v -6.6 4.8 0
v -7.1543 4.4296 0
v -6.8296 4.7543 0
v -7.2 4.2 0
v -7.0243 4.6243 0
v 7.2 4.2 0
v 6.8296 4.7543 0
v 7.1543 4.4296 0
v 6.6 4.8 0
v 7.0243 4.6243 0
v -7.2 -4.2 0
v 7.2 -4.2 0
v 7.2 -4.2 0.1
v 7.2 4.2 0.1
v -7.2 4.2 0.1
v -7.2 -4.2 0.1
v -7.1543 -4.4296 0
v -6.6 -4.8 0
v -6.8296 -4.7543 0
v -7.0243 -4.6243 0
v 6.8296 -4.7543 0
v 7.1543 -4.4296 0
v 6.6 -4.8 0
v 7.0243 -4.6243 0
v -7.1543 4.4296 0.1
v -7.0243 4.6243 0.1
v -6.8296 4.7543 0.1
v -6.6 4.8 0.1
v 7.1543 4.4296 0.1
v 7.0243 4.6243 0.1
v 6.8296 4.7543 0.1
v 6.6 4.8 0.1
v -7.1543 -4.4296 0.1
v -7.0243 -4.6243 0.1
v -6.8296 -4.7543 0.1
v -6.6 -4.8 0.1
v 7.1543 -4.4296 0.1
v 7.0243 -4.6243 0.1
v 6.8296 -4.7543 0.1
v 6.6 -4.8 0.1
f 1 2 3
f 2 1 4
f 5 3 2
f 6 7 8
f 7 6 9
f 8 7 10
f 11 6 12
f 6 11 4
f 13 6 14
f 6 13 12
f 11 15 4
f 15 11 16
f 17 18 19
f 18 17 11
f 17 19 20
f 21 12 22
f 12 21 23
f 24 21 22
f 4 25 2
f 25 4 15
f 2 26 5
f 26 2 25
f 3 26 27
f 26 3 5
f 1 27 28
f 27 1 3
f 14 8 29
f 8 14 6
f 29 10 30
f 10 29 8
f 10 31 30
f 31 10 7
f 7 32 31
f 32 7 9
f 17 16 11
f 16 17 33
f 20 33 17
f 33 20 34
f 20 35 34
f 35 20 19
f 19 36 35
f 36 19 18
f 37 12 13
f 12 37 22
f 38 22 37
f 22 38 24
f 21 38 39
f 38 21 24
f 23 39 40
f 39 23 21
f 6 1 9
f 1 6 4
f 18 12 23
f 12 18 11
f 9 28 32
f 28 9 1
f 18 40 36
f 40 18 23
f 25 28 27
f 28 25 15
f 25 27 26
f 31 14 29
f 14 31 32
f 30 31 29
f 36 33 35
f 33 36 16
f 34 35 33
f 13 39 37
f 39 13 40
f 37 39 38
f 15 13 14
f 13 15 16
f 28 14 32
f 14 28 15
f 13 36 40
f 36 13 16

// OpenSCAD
// file: ../p/box3u12.scad
use <../lib.scad>
function ldraw_lib__box3u12() = [
// 0 Box with 3 Parallel Faces without Any Edges
// 0 Name: box3u12.dat
// 0 Author: J.C. Tchang [tchang]
// 0 !LDRAW_ORG Primitive UPDATE 2014-02
// 0 !LICENSE Licensed under CC BY 4.0 : see CAreadme.txt
// 
// 0 BFC CERTIFY CCW
  [0,"BFC","CERTIFY"],
  [0,"BFC","CCW"],
// 
// 0 !HISTORY 2014-12-23 [PTadmin] Official Update 2014-02
// 
// 
// 4 16 -1 1 1 1 1 1 1 1 -1 -1 1 -1
  [4,16,-1,1,1,1,1,1,1,1,-1,-1,1,-1],
// 4 16 -1 1 1 -1 0 1 1 0 1 1 1 1
  [4,16,-1,1,1,-1,0,1,1,0,1,1,1,1],
// 4 16 1 1 -1 1 0 -1 -1 0 -1 -1 1 -1
  [4,16,1,1,-1,1,0,-1,-1,0,-1,-1,1,-1],
];
module ldraw_lib__box3u12(step=0, col=false, unit=2/5, alt=false, line=0.2, solid=!$preview)
    makepoly(ldraw_lib__box3u12(), step=step, col=col, unit=unit, alt=alt, line=line, solid=solid);
ldraw_lib__box3u12(line=0.2);
// file: ../p/1-4cyli.scad
use <../lib.scad>
function ldraw_lib__1_4cyli() = [
// 0 Cylinder 0.25
// 0 Name: 1-4cyli.dat
// 0 Author: James Jessiman
// 0 !LDRAW_ORG Primitive UPDATE 2012-01
// 0 !LICENSE Licensed under CC BY 4.0 : see CAreadme.txt
// 
// 0 BFC CERTIFY CCW
  [0,"BFC","CERTIFY"],
  [0,"BFC","CCW"],
// 
// 0 !HISTORY 2002-03-23 [sbliss] Added BFC statement.
// 0 !HISTORY 2002-04-25 [PTadmin] Official Update 2002-02
// 0 !HISTORY 2007-06-22 [PTadmin] Header formatted for Contributor Agreement
// 0 !HISTORY 2008-07-01 [PTadmin] Official Update 2008-01
// 0 !HISTORY 2012-02-16 [Philo] Changed to CCW
// 0 !HISTORY 2012-03-30 [PTadmin] Official Update 2012-01
// 
// 
// 4 16 1 1 0 0.9239 1 0.3827 0.9239 0 0.3827 1 0 0
  [4,16,1,1,0,0.9239,1,0.3827,0.9239,0,0.3827,1,0,0],
// 5 24 1 0 0 1 1 0 0.9239 0 0.3827 1 0 -1
  [5,24,1,0,0,1,1,0,0.9239,0,0.3827,1,0,-1],
// 4 16 0.9239 1 0.3827 0.7071 1 0.7071 0.7071 0 0.7071 0.9239 0 0.3827
  [4,16,0.9239,1,0.3827,0.7071,1,0.7071,0.7071,0,0.7071,0.9239,0,0.3827],
// 5 24 0.9239 0 0.3827 0.9239 1 0.3827 0.7071 0 0.7071 1 0 0
  [5,24,0.9239,0,0.3827,0.9239,1,0.3827,0.7071,0,0.7071,1,0,0],
// 4 16 0.7071 1 0.7071 0.3827 1 0.9239 0.3827 0 0.9239 0.7071 0 0.7071
  [4,16,0.7071,1,0.7071,0.3827,1,0.9239,0.3827,0,0.9239,0.7071,0,0.7071],
// 5 24 0.7071 0 0.7071 0.7071 1 0.7071 0.3827 0 0.9239 0.9239 0 0.3827
  [5,24,0.7071,0,0.7071,0.7071,1,0.7071,0.3827,0,0.9239,0.9239,0,0.3827],
// 4 16 0.3827 1 0.9239 0 1 1 0 0 1 0.3827 0 0.9239
  [4,16,0.3827,1,0.9239,0,1,1,0,0,1,0.3827,0,0.9239],
// 5 24 0.3827 0 0.9239 0.3827 1 0.9239 0 0 1 0.7071 0 0.7071
  [5,24,0.3827,0,0.9239,0.3827,1,0.9239,0,0,1,0.7071,0,0.7071],
// 5 24 0 0 1 0 1 1 0.3827 0 0.9239 -1 0 1
  [5,24,0,0,1,0,1,1,0.3827,0,0.9239,-1,0,1],
];
module ldraw_lib__1_4cyli(step=0, col=false, unit=2/5, alt=false, line=0.2, solid=!$preview)
    makepoly(ldraw_lib__1_4cyli(), step=step, col=col, unit=unit, alt=alt, line=line, solid=solid);
ldraw_lib__1_4cyli(line=0.2);
// file: s/stickerback012x018.scad
use <../../lib.scad>
use <../../p/1-4chrd.scad>
use <../../p/1-4cyli.scad>
use <../../p/box3u12.scad>
function ldraw_lib__s__stickerback012x018() = [
// 0 ~Sticker Back  1.2 x  1.8
// 0 Name: s\stickerback012x018.dat
// 0 Author: Takeshi Takahashi [RainbowDolphin]
// 0 !LDRAW_ORG Subpart UPDATE 2025-11
// 0 !LICENSE Licensed under CC BY 4.0 : see CAreadme.txt
// 
// 0 BFC CERTIFY CCW
  [0,"BFC","CERTIFY"],
  [0,"BFC","CCW"],
// 
// 0 !HISTORY 2025-11-30 [OrionP] Official Update 2025-11
// 
// 0 // Primitives
// 1 16 -16.5 0 10.5 -1.5 0 0 0 -1 0 0 0 1.5 1-4chrd.dat
  [1,16,-16.5,0,10.5,-1.5,0,0,0,-1,0,0,0,1.5, ldraw_lib__1_4chrd()],
// 1 16 16.5 0 10.5 1.5 0 0 0 -1 0 0 0 1.5 1-4chrd.dat
  [1,16,16.5,0,10.5,1.5,0,0,0,-1,0,0,0,1.5, ldraw_lib__1_4chrd()],
// 1 16 0 -.25 0 0 0 18 0 .25 0 10.5 0 0 box3u12.dat
  [1,16,0,-.25,0,0,0,18,0,.25,0,10.5,0,0, ldraw_lib__box3u12()],
// 1 16 -16.5 0 -10.5 -1.5 0 0 0 -1 0 0 0 -1.5 1-4chrd.dat
  [1,16,-16.5,0,-10.5,-1.5,0,0,0,-1,0,0,0,-1.5, ldraw_lib__1_4chrd()],
// 1 16 16.5 0 -10.5 1.5 0 0 0 -1 0 0 0 -1.5 1-4chrd.dat
  [1,16,16.5,0,-10.5,1.5,0,0,0,-1,0,0,0,-1.5, ldraw_lib__1_4chrd()],
// 1 16 -16.5 0 10.5 -1.5 0 0 0 -.25 0 0 0 1.5 1-4cyli.dat
  [1,16,-16.5,0,10.5,-1.5,0,0,0,-.25,0,0,0,1.5, ldraw_lib__1_4cyli()],
// 1 16 16.5 0 10.5 1.5 0 0 0 -.25 0 0 0 1.5 1-4cyli.dat
  [1,16,16.5,0,10.5,1.5,0,0,0,-.25,0,0,0,1.5, ldraw_lib__1_4cyli()],
// 1 16 -16.5 0 -10.5 -1.5 0 0 0 -.25 0 0 0 -1.5 1-4cyli.dat
  [1,16,-16.5,0,-10.5,-1.5,0,0,0,-.25,0,0,0,-1.5, ldraw_lib__1_4cyli()],
// 1 16 16.5 0 -10.5 1.5 0 0 0 -.25 0 0 0 -1.5 1-4cyli.dat
  [1,16,16.5,0,-10.5,1.5,0,0,0,-.25,0,0,0,-1.5, ldraw_lib__1_4cyli()],
// 0 // Bottom face
// 4 16 -18 0 10.5 -16.5 0 12 16.5 0 12 18 0 10.5
  [4,16,-18,0,10.5,-16.5,0,12,16.5,0,12,18,0,10.5],
// 4 16 -18 0 -10.5 18 0 -10.5 16.5 0 -12 -16.5 0 -12
  [4,16,-18,0,-10.5,18,0,-10.5,16.5,0,-12,-16.5,0,-12],
// 0 // Lateral face
// 4 16 -16.5 0 12 -16.5 -.25 12 16.5 -.25 12 16.5 0 12
  [4,16,-16.5,0,12,-16.5,-.25,12,16.5,-.25,12,16.5,0,12],
// 4 16 -16.5 0 -12 16.5 0 -12 16.5 -.25 -12 -16.5 -.25 -12
  [4,16,-16.5,0,-12,16.5,0,-12,16.5,-.25,-12,-16.5,-.25,-12],
];
module ldraw_lib__s__stickerback012x018(step=0, col=false, unit=2/5, alt=false, line=0.2, solid=!$preview)
    makepoly(ldraw_lib__s__stickerback012x018(), step=step, col=col, unit=unit, alt=alt, line=line, solid=solid);
ldraw_lib__s__stickerback012x018(line=0.2);
// file: ../p/1-4chrd.scad
use <../lib.scad>
function ldraw_lib__1_4chrd() = [
// 0 Chord 0.25
// 0 Name: 1-4chrd.dat
// 0 Author: Max Martin Richter [MMR1988]
// 0 !LDRAW_ORG Primitive UPDATE 2023-05
// 0 !LICENSE Licensed under CC BY 4.0 : see CAreadme.txt
// 
// 0 BFC CERTIFY CCW
  [0,"BFC","CERTIFY"],
  [0,"BFC","CCW"],
// 
// 0 !HISTORY 2004-04-22 [PTadmin] Official Update 2004-02
// 0 !HISTORY 2007-10-09 [PTadmin] Header formatted for Contributor Agreement
// 0 !HISTORY 2008-07-01 [PTadmin] Official Update 2008-01
// 0 !HISTORY 2012-08-02 [MMR1988] Re-creation with PrimGen2 and Rectifier
// 0 !HISTORY 2012-08-09 [PTadmin] Official Update 2012-02
// 0 !HISTORY 2023-10-27 [OrionP] Change author to MMR1988 from hafhead
// 0 !HISTORY 2023-10-31 [OrionP] Official Update 2023-05
// 
// 4 16 0.9239 0 0.3827 0.3827 0 0.9239 0 0 1 1 0 0
  [4,16,0.9239,0,0.3827,0.3827,0,0.9239,0,0,1,1,0,0],
// 3 16 0.7071 0 0.7071 0.3827 0 0.9239 0.9239 0 0.3827
  [3,16,0.7071,0,0.7071,0.3827,0,0.9239,0.9239,0,0.3827],
];
module ldraw_lib__1_4chrd(step=0, col=false, unit=2/5, alt=false, line=0.2, solid=!$preview)
    makepoly(ldraw_lib__1_4chrd(), step=step, col=col, unit=unit, alt=alt, line=line, solid=solid);
ldraw_lib__1_4chrd(line=0.2);
// main file
use <../lib.scad>
use <../p/1-4chrd.scad>
use <s/stickerback012x018.scad>
function ldraw_lib__4629791a() = [
// 0 Sticker  1.2 x  1.8 with Chrome Silver Mirror
// 0 Name: 4629791a.dat
// 0 Author: Takeshi Takahashi [RainbowDolphin]
// 0 !LDRAW_ORG Part UPDATE 2025-12
// 0 !LICENSE Licensed under CC BY 4.0 : see CAreadme.txt
// 
// 0 BFC CERTIFY CCW
  [0,"BFC","CERTIFY"],
  [0,"BFC","CCW"],
// 
// 0 !KEYWORDS BrickLink 5770stk01, Brickowl 151910, Lighthouse, Rebrickable 96624
// 0 !KEYWORDS Set 5770
// 
// 0 !HISTORY 2022-09-15 [PTadmin] Official Update 2022-05
// 0 !HISTORY 2025-08-24 [RainbowDolphin] Updated with latest sticker spec
// 0 !HISTORY 2025-11-30 [OrionP] Official Update 2025-11
// 0 !HISTORY 2025-12-25 [OrionP] Minor header edits
// 0 !HISTORY 2025-12-25 [OrionP] Official Update 2025-12
// 
// 1 16 0 0 0 1 0 0 0 1 0 0 0 1 s\stickerback012x018.dat
  [1,16,0,0,0,1,0,0,0,1,0,0,0,1, ldraw_lib__s__stickerback012x018()],
// 1 383 -16.5 -.25 10.5 -1.5 0 0 0 1 0 0 0 1.5 1-4chrd.dat
  [1,383,-16.5,-.25,10.5,-1.5,0,0,0,1,0,0,0,1.5, ldraw_lib__1_4chrd()],
// 1 383 16.5 -.25 10.5 1.5 0 0 0 1 0 0 0 1.5 1-4chrd.dat
  [1,383,16.5,-.25,10.5,1.5,0,0,0,1,0,0,0,1.5, ldraw_lib__1_4chrd()],
// 1 383 -16.5 -.25 -10.5 -1.5 0 0 0 1 0 0 0 -1.5 1-4chrd.dat
  [1,383,-16.5,-.25,-10.5,-1.5,0,0,0,1,0,0,0,-1.5, ldraw_lib__1_4chrd()],
// 1 383 16.5 -.25 -10.5 1.5 0 0 0 1 0 0 0 -1.5 1-4chrd.dat
  [1,383,16.5,-.25,-10.5,1.5,0,0,0,1,0,0,0,-1.5, ldraw_lib__1_4chrd()],
// 4 383 18 -.25 10.5 -18 -.25 10.5 -18 -.25 -10.5 18 -.25 -10.5
  [4,383,18,-.25,10.5,-18,-.25,10.5,-18,-.25,-10.5,18,-.25,-10.5],
// 4 383 16.5 -.25 12 -16.5 -.25 12 -18 -.25 10.5 18 -.25 10.5
  [4,383,16.5,-.25,12,-16.5,-.25,12,-18,-.25,10.5,18,-.25,10.5],
// 4 383 16.5 -.25 -12 18 -.25 -10.5 -18 -.25 -10.5 -16.5 -.25 -12
  [4,383,16.5,-.25,-12,18,-.25,-10.5,-18,-.25,-10.5,-16.5,-.25,-12],
];
module ldraw_lib__4629791a(step=0, col=false, unit=2/5, alt=false, line=0.2, solid=!$preview)
    makepoly(ldraw_lib__4629791a(), step=step, col=col, unit=unit, alt=alt, line=line, solid=solid);
ldraw_lib__4629791a(line=0.2);
